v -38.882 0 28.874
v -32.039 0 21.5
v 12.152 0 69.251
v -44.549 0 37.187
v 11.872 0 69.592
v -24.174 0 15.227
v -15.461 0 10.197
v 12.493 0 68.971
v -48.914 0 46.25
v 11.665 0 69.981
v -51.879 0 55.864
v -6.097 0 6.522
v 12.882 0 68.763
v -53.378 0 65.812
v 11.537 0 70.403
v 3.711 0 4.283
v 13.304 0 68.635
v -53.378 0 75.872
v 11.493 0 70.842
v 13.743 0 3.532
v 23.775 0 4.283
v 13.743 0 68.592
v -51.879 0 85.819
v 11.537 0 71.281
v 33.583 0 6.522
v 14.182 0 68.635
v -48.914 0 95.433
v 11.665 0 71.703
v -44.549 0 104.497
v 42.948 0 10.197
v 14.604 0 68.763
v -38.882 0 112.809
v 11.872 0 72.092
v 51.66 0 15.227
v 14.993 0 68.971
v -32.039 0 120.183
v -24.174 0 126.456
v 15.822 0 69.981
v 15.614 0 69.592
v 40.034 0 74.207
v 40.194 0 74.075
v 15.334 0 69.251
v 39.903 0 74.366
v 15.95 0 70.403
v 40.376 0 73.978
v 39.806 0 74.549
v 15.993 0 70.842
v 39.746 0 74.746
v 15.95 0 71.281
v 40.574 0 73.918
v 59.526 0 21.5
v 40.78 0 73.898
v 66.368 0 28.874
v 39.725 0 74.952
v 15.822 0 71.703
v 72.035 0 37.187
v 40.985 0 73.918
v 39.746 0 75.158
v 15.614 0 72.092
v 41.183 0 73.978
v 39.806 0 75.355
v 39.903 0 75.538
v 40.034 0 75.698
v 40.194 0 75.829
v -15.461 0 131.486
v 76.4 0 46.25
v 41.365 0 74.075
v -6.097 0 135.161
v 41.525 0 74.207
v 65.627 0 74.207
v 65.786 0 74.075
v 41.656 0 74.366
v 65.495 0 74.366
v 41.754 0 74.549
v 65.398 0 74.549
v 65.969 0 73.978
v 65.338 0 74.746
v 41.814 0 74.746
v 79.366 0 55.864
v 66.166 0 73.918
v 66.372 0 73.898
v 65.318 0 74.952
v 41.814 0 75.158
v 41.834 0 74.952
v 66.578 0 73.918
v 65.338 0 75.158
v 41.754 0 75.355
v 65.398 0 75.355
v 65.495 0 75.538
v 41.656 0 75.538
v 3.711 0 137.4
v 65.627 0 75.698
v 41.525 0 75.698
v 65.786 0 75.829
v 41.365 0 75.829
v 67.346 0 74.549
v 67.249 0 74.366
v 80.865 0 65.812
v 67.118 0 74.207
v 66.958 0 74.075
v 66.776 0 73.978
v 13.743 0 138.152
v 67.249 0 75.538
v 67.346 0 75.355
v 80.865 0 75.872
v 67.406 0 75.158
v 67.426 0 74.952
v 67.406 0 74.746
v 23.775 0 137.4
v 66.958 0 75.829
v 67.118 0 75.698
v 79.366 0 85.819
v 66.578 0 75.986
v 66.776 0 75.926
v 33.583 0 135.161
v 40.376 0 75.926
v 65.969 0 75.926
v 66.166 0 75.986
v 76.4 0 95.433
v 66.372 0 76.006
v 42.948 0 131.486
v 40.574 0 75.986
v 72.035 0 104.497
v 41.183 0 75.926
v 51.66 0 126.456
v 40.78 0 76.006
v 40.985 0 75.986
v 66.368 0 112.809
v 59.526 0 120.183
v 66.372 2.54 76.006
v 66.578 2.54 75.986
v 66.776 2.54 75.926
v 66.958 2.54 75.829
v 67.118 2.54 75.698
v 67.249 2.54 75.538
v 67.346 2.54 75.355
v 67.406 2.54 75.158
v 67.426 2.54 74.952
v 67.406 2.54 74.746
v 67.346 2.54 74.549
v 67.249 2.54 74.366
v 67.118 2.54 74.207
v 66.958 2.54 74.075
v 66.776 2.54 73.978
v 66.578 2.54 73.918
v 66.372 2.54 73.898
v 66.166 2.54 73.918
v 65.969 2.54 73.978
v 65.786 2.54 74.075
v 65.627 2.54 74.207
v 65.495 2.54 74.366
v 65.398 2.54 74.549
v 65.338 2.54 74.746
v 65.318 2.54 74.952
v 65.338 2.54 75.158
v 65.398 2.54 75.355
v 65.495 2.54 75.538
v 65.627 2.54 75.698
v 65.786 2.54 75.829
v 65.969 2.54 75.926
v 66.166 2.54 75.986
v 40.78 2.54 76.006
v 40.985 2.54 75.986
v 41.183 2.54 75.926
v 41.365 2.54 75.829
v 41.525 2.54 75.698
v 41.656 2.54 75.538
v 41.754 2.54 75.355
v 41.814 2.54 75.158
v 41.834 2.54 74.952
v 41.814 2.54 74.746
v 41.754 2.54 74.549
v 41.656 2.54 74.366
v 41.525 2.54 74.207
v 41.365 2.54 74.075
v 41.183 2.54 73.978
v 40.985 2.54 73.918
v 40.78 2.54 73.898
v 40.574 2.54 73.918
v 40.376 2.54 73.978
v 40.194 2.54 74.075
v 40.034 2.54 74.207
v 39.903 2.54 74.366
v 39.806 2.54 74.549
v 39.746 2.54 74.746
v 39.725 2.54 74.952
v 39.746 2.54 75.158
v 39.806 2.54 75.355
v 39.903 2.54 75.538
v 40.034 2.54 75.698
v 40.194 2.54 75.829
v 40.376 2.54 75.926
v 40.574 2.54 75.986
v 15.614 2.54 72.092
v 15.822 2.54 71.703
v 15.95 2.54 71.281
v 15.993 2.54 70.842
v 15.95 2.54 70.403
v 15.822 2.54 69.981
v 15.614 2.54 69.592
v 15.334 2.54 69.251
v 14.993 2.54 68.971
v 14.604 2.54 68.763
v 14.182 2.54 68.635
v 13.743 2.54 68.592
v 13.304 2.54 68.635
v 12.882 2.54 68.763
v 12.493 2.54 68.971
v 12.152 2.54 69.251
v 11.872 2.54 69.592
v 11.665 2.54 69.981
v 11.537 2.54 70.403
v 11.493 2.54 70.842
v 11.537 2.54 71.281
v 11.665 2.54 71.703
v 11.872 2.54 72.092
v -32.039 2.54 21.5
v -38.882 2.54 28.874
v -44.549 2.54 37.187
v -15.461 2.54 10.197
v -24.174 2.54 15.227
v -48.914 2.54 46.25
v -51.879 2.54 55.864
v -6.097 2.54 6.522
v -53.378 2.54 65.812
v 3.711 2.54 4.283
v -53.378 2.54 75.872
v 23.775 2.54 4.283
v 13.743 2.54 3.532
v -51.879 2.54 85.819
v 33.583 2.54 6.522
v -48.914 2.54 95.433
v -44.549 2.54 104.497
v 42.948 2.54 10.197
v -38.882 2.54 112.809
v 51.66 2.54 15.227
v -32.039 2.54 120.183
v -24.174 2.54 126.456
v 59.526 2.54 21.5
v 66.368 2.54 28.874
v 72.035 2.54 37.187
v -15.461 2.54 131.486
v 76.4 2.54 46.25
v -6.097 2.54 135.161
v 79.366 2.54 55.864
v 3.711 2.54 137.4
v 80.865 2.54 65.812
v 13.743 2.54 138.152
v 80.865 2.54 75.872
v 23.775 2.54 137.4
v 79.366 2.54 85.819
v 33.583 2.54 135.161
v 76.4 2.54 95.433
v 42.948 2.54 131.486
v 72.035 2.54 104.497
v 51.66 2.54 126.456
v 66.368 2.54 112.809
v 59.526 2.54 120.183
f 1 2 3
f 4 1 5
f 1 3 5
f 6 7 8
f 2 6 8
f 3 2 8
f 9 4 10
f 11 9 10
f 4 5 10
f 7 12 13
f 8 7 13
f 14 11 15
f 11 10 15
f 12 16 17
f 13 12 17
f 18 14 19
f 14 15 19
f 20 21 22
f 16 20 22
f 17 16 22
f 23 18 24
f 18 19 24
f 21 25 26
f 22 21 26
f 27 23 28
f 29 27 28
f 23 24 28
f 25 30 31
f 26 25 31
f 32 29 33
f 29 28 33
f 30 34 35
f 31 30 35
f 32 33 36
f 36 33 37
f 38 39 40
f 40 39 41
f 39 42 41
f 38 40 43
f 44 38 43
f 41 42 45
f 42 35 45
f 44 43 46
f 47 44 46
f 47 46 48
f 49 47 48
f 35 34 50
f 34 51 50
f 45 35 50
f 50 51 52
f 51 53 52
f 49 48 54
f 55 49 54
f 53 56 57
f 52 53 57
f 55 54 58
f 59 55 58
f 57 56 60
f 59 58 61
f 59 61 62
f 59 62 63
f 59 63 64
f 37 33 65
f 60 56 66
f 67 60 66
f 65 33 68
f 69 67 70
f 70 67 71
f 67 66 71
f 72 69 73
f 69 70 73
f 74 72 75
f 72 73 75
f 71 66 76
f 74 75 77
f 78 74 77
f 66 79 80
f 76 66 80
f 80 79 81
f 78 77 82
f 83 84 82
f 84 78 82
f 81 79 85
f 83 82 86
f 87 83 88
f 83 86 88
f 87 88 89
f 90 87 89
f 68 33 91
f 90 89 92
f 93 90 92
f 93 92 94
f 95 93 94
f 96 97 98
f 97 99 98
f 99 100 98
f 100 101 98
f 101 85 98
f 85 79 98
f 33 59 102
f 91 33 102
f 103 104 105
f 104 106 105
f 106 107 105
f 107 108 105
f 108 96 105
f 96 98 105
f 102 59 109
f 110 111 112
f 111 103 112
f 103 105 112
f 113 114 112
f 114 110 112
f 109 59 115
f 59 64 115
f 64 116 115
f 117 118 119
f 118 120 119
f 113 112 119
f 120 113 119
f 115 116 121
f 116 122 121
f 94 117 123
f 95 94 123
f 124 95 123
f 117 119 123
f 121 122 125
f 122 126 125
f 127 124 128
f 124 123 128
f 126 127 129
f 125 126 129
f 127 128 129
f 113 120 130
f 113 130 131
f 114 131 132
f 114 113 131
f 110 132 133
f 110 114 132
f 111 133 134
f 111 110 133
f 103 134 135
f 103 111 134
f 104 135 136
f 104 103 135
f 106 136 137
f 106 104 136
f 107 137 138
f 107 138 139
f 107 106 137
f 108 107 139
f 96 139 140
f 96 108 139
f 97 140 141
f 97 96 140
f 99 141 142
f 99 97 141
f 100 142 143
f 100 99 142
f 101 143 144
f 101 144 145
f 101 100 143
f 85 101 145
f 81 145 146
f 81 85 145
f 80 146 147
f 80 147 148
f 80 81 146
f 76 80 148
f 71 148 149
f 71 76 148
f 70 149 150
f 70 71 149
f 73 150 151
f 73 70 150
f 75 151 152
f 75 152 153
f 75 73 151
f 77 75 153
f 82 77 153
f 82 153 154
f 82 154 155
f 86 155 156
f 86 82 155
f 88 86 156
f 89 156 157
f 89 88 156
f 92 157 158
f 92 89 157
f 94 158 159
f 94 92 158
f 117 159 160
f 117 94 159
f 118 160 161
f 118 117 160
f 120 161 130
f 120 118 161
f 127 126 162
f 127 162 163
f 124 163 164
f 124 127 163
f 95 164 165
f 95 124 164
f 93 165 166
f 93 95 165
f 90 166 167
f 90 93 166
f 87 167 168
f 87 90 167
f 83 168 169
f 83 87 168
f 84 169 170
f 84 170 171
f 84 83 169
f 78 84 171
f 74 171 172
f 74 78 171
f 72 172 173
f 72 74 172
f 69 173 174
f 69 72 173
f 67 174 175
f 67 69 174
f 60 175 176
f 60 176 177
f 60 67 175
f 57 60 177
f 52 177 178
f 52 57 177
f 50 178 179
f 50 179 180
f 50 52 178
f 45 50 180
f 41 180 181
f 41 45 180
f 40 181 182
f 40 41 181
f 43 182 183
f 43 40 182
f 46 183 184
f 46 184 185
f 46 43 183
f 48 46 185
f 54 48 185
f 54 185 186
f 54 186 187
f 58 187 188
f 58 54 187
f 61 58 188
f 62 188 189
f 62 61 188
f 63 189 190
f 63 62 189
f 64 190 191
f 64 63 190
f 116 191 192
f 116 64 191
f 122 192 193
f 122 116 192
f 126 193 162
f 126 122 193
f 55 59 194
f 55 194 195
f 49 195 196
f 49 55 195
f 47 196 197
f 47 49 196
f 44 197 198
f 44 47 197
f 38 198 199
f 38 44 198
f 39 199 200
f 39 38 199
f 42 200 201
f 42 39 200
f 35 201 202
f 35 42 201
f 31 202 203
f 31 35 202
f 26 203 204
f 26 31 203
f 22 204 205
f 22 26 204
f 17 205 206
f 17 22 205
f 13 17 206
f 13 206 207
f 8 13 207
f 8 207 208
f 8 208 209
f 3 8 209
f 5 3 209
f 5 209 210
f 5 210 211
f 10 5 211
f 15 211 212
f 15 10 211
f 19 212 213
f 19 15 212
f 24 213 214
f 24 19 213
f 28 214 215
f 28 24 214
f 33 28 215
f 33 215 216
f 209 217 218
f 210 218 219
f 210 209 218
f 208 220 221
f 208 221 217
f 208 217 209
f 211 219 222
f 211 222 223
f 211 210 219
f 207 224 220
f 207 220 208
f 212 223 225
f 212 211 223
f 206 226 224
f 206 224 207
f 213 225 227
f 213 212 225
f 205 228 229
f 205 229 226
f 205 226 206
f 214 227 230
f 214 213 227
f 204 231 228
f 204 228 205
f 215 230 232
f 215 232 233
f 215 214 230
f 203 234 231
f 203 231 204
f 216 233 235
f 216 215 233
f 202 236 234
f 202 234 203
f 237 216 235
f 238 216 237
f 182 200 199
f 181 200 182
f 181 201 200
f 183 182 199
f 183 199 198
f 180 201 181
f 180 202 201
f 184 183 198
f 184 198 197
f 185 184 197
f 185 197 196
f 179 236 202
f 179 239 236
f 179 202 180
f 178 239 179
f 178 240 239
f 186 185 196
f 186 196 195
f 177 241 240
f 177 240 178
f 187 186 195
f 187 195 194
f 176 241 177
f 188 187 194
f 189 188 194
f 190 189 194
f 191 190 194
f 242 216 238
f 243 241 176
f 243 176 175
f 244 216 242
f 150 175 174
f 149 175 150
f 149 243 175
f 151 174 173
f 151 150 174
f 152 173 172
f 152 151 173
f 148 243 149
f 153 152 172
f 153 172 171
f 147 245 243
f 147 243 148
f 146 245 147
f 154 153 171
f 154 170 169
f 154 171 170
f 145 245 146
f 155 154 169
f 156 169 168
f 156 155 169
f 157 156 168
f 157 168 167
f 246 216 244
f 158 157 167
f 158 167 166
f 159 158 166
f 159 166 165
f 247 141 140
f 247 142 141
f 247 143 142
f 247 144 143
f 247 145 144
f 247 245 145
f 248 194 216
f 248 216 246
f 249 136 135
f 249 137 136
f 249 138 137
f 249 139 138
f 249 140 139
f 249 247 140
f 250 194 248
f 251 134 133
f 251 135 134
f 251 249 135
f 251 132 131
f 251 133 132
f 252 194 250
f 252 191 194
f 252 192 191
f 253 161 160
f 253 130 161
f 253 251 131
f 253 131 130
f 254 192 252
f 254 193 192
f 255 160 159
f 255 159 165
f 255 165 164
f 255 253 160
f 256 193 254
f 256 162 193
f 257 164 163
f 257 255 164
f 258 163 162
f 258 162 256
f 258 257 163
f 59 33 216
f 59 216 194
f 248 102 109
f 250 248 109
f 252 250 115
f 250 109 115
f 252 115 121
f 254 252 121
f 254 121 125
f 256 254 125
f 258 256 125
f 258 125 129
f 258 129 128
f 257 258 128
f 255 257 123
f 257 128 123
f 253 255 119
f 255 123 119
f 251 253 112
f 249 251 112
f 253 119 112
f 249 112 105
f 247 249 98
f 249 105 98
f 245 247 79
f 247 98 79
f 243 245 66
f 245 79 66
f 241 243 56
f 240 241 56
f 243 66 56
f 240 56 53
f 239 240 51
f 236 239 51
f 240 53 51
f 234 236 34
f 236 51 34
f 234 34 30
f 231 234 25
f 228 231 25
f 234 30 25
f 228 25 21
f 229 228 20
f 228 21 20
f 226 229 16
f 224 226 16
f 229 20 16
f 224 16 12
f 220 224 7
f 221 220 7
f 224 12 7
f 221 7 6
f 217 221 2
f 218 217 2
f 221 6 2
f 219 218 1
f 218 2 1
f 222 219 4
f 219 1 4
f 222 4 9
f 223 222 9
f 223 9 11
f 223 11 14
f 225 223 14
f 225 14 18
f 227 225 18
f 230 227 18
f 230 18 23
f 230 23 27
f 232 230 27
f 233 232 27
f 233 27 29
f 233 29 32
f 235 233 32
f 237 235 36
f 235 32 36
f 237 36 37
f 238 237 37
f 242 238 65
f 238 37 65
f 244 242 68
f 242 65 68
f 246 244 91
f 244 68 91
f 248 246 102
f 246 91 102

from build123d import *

# Parameters (mm, degrees)
RECORD_R             = 67.31
RECORD_R_2           = 1.054294776
RECORD_EXTRUDE_DEPTH = 2.54
MOTOR_HOLE_DEPTH     = 2.54


# Read off the part's stored shape, not the designer's step: Motor Hole
with BuildPart() as part:
    # Record → Record Extrude (new body)
    with BuildSketch(Plane(origin=(0, 0, 0), x_dir=(1, 0, 0), z_dir=(0, 1, 0))):
        with Locations(Location((13.743289035, -70.841587708, 0), (0, 0, 270))):
            Circle(RECORD_R)
        with Locations(Location((66.372058646, -74.952013208, 0), (0, 0, 270))):
            Circle(RECORD_R_2, mode=Mode.SUBTRACT)
        with Locations(Location((40.779568941, -74.952013208, 0), (0, 0, 270))):
            Circle(RECORD_R_2, mode=Mode.SUBTRACT)
    extrude(amount=RECORD_EXTRUDE_DEPTH)

    # Motor Hole outline → Motor Hole (cut)
    with BuildSketch(Plane(origin=(0, 0, 0), x_dir=(1, 0, 0), z_dir=(0, 1, 0))):
        with BuildLine():
            Line((11.872460342, -72.091587708), (15.614117728, -72.091587708))
            ThreePointArc((15.614117728, -72.091587708), (13.743289035, -68.591587708), (11.872460342, -72.091587708))
        make_face()
    extrude(amount=MOTOR_HOLE_DEPTH, mode=Mode.SUBTRACT)


solid = part.part
